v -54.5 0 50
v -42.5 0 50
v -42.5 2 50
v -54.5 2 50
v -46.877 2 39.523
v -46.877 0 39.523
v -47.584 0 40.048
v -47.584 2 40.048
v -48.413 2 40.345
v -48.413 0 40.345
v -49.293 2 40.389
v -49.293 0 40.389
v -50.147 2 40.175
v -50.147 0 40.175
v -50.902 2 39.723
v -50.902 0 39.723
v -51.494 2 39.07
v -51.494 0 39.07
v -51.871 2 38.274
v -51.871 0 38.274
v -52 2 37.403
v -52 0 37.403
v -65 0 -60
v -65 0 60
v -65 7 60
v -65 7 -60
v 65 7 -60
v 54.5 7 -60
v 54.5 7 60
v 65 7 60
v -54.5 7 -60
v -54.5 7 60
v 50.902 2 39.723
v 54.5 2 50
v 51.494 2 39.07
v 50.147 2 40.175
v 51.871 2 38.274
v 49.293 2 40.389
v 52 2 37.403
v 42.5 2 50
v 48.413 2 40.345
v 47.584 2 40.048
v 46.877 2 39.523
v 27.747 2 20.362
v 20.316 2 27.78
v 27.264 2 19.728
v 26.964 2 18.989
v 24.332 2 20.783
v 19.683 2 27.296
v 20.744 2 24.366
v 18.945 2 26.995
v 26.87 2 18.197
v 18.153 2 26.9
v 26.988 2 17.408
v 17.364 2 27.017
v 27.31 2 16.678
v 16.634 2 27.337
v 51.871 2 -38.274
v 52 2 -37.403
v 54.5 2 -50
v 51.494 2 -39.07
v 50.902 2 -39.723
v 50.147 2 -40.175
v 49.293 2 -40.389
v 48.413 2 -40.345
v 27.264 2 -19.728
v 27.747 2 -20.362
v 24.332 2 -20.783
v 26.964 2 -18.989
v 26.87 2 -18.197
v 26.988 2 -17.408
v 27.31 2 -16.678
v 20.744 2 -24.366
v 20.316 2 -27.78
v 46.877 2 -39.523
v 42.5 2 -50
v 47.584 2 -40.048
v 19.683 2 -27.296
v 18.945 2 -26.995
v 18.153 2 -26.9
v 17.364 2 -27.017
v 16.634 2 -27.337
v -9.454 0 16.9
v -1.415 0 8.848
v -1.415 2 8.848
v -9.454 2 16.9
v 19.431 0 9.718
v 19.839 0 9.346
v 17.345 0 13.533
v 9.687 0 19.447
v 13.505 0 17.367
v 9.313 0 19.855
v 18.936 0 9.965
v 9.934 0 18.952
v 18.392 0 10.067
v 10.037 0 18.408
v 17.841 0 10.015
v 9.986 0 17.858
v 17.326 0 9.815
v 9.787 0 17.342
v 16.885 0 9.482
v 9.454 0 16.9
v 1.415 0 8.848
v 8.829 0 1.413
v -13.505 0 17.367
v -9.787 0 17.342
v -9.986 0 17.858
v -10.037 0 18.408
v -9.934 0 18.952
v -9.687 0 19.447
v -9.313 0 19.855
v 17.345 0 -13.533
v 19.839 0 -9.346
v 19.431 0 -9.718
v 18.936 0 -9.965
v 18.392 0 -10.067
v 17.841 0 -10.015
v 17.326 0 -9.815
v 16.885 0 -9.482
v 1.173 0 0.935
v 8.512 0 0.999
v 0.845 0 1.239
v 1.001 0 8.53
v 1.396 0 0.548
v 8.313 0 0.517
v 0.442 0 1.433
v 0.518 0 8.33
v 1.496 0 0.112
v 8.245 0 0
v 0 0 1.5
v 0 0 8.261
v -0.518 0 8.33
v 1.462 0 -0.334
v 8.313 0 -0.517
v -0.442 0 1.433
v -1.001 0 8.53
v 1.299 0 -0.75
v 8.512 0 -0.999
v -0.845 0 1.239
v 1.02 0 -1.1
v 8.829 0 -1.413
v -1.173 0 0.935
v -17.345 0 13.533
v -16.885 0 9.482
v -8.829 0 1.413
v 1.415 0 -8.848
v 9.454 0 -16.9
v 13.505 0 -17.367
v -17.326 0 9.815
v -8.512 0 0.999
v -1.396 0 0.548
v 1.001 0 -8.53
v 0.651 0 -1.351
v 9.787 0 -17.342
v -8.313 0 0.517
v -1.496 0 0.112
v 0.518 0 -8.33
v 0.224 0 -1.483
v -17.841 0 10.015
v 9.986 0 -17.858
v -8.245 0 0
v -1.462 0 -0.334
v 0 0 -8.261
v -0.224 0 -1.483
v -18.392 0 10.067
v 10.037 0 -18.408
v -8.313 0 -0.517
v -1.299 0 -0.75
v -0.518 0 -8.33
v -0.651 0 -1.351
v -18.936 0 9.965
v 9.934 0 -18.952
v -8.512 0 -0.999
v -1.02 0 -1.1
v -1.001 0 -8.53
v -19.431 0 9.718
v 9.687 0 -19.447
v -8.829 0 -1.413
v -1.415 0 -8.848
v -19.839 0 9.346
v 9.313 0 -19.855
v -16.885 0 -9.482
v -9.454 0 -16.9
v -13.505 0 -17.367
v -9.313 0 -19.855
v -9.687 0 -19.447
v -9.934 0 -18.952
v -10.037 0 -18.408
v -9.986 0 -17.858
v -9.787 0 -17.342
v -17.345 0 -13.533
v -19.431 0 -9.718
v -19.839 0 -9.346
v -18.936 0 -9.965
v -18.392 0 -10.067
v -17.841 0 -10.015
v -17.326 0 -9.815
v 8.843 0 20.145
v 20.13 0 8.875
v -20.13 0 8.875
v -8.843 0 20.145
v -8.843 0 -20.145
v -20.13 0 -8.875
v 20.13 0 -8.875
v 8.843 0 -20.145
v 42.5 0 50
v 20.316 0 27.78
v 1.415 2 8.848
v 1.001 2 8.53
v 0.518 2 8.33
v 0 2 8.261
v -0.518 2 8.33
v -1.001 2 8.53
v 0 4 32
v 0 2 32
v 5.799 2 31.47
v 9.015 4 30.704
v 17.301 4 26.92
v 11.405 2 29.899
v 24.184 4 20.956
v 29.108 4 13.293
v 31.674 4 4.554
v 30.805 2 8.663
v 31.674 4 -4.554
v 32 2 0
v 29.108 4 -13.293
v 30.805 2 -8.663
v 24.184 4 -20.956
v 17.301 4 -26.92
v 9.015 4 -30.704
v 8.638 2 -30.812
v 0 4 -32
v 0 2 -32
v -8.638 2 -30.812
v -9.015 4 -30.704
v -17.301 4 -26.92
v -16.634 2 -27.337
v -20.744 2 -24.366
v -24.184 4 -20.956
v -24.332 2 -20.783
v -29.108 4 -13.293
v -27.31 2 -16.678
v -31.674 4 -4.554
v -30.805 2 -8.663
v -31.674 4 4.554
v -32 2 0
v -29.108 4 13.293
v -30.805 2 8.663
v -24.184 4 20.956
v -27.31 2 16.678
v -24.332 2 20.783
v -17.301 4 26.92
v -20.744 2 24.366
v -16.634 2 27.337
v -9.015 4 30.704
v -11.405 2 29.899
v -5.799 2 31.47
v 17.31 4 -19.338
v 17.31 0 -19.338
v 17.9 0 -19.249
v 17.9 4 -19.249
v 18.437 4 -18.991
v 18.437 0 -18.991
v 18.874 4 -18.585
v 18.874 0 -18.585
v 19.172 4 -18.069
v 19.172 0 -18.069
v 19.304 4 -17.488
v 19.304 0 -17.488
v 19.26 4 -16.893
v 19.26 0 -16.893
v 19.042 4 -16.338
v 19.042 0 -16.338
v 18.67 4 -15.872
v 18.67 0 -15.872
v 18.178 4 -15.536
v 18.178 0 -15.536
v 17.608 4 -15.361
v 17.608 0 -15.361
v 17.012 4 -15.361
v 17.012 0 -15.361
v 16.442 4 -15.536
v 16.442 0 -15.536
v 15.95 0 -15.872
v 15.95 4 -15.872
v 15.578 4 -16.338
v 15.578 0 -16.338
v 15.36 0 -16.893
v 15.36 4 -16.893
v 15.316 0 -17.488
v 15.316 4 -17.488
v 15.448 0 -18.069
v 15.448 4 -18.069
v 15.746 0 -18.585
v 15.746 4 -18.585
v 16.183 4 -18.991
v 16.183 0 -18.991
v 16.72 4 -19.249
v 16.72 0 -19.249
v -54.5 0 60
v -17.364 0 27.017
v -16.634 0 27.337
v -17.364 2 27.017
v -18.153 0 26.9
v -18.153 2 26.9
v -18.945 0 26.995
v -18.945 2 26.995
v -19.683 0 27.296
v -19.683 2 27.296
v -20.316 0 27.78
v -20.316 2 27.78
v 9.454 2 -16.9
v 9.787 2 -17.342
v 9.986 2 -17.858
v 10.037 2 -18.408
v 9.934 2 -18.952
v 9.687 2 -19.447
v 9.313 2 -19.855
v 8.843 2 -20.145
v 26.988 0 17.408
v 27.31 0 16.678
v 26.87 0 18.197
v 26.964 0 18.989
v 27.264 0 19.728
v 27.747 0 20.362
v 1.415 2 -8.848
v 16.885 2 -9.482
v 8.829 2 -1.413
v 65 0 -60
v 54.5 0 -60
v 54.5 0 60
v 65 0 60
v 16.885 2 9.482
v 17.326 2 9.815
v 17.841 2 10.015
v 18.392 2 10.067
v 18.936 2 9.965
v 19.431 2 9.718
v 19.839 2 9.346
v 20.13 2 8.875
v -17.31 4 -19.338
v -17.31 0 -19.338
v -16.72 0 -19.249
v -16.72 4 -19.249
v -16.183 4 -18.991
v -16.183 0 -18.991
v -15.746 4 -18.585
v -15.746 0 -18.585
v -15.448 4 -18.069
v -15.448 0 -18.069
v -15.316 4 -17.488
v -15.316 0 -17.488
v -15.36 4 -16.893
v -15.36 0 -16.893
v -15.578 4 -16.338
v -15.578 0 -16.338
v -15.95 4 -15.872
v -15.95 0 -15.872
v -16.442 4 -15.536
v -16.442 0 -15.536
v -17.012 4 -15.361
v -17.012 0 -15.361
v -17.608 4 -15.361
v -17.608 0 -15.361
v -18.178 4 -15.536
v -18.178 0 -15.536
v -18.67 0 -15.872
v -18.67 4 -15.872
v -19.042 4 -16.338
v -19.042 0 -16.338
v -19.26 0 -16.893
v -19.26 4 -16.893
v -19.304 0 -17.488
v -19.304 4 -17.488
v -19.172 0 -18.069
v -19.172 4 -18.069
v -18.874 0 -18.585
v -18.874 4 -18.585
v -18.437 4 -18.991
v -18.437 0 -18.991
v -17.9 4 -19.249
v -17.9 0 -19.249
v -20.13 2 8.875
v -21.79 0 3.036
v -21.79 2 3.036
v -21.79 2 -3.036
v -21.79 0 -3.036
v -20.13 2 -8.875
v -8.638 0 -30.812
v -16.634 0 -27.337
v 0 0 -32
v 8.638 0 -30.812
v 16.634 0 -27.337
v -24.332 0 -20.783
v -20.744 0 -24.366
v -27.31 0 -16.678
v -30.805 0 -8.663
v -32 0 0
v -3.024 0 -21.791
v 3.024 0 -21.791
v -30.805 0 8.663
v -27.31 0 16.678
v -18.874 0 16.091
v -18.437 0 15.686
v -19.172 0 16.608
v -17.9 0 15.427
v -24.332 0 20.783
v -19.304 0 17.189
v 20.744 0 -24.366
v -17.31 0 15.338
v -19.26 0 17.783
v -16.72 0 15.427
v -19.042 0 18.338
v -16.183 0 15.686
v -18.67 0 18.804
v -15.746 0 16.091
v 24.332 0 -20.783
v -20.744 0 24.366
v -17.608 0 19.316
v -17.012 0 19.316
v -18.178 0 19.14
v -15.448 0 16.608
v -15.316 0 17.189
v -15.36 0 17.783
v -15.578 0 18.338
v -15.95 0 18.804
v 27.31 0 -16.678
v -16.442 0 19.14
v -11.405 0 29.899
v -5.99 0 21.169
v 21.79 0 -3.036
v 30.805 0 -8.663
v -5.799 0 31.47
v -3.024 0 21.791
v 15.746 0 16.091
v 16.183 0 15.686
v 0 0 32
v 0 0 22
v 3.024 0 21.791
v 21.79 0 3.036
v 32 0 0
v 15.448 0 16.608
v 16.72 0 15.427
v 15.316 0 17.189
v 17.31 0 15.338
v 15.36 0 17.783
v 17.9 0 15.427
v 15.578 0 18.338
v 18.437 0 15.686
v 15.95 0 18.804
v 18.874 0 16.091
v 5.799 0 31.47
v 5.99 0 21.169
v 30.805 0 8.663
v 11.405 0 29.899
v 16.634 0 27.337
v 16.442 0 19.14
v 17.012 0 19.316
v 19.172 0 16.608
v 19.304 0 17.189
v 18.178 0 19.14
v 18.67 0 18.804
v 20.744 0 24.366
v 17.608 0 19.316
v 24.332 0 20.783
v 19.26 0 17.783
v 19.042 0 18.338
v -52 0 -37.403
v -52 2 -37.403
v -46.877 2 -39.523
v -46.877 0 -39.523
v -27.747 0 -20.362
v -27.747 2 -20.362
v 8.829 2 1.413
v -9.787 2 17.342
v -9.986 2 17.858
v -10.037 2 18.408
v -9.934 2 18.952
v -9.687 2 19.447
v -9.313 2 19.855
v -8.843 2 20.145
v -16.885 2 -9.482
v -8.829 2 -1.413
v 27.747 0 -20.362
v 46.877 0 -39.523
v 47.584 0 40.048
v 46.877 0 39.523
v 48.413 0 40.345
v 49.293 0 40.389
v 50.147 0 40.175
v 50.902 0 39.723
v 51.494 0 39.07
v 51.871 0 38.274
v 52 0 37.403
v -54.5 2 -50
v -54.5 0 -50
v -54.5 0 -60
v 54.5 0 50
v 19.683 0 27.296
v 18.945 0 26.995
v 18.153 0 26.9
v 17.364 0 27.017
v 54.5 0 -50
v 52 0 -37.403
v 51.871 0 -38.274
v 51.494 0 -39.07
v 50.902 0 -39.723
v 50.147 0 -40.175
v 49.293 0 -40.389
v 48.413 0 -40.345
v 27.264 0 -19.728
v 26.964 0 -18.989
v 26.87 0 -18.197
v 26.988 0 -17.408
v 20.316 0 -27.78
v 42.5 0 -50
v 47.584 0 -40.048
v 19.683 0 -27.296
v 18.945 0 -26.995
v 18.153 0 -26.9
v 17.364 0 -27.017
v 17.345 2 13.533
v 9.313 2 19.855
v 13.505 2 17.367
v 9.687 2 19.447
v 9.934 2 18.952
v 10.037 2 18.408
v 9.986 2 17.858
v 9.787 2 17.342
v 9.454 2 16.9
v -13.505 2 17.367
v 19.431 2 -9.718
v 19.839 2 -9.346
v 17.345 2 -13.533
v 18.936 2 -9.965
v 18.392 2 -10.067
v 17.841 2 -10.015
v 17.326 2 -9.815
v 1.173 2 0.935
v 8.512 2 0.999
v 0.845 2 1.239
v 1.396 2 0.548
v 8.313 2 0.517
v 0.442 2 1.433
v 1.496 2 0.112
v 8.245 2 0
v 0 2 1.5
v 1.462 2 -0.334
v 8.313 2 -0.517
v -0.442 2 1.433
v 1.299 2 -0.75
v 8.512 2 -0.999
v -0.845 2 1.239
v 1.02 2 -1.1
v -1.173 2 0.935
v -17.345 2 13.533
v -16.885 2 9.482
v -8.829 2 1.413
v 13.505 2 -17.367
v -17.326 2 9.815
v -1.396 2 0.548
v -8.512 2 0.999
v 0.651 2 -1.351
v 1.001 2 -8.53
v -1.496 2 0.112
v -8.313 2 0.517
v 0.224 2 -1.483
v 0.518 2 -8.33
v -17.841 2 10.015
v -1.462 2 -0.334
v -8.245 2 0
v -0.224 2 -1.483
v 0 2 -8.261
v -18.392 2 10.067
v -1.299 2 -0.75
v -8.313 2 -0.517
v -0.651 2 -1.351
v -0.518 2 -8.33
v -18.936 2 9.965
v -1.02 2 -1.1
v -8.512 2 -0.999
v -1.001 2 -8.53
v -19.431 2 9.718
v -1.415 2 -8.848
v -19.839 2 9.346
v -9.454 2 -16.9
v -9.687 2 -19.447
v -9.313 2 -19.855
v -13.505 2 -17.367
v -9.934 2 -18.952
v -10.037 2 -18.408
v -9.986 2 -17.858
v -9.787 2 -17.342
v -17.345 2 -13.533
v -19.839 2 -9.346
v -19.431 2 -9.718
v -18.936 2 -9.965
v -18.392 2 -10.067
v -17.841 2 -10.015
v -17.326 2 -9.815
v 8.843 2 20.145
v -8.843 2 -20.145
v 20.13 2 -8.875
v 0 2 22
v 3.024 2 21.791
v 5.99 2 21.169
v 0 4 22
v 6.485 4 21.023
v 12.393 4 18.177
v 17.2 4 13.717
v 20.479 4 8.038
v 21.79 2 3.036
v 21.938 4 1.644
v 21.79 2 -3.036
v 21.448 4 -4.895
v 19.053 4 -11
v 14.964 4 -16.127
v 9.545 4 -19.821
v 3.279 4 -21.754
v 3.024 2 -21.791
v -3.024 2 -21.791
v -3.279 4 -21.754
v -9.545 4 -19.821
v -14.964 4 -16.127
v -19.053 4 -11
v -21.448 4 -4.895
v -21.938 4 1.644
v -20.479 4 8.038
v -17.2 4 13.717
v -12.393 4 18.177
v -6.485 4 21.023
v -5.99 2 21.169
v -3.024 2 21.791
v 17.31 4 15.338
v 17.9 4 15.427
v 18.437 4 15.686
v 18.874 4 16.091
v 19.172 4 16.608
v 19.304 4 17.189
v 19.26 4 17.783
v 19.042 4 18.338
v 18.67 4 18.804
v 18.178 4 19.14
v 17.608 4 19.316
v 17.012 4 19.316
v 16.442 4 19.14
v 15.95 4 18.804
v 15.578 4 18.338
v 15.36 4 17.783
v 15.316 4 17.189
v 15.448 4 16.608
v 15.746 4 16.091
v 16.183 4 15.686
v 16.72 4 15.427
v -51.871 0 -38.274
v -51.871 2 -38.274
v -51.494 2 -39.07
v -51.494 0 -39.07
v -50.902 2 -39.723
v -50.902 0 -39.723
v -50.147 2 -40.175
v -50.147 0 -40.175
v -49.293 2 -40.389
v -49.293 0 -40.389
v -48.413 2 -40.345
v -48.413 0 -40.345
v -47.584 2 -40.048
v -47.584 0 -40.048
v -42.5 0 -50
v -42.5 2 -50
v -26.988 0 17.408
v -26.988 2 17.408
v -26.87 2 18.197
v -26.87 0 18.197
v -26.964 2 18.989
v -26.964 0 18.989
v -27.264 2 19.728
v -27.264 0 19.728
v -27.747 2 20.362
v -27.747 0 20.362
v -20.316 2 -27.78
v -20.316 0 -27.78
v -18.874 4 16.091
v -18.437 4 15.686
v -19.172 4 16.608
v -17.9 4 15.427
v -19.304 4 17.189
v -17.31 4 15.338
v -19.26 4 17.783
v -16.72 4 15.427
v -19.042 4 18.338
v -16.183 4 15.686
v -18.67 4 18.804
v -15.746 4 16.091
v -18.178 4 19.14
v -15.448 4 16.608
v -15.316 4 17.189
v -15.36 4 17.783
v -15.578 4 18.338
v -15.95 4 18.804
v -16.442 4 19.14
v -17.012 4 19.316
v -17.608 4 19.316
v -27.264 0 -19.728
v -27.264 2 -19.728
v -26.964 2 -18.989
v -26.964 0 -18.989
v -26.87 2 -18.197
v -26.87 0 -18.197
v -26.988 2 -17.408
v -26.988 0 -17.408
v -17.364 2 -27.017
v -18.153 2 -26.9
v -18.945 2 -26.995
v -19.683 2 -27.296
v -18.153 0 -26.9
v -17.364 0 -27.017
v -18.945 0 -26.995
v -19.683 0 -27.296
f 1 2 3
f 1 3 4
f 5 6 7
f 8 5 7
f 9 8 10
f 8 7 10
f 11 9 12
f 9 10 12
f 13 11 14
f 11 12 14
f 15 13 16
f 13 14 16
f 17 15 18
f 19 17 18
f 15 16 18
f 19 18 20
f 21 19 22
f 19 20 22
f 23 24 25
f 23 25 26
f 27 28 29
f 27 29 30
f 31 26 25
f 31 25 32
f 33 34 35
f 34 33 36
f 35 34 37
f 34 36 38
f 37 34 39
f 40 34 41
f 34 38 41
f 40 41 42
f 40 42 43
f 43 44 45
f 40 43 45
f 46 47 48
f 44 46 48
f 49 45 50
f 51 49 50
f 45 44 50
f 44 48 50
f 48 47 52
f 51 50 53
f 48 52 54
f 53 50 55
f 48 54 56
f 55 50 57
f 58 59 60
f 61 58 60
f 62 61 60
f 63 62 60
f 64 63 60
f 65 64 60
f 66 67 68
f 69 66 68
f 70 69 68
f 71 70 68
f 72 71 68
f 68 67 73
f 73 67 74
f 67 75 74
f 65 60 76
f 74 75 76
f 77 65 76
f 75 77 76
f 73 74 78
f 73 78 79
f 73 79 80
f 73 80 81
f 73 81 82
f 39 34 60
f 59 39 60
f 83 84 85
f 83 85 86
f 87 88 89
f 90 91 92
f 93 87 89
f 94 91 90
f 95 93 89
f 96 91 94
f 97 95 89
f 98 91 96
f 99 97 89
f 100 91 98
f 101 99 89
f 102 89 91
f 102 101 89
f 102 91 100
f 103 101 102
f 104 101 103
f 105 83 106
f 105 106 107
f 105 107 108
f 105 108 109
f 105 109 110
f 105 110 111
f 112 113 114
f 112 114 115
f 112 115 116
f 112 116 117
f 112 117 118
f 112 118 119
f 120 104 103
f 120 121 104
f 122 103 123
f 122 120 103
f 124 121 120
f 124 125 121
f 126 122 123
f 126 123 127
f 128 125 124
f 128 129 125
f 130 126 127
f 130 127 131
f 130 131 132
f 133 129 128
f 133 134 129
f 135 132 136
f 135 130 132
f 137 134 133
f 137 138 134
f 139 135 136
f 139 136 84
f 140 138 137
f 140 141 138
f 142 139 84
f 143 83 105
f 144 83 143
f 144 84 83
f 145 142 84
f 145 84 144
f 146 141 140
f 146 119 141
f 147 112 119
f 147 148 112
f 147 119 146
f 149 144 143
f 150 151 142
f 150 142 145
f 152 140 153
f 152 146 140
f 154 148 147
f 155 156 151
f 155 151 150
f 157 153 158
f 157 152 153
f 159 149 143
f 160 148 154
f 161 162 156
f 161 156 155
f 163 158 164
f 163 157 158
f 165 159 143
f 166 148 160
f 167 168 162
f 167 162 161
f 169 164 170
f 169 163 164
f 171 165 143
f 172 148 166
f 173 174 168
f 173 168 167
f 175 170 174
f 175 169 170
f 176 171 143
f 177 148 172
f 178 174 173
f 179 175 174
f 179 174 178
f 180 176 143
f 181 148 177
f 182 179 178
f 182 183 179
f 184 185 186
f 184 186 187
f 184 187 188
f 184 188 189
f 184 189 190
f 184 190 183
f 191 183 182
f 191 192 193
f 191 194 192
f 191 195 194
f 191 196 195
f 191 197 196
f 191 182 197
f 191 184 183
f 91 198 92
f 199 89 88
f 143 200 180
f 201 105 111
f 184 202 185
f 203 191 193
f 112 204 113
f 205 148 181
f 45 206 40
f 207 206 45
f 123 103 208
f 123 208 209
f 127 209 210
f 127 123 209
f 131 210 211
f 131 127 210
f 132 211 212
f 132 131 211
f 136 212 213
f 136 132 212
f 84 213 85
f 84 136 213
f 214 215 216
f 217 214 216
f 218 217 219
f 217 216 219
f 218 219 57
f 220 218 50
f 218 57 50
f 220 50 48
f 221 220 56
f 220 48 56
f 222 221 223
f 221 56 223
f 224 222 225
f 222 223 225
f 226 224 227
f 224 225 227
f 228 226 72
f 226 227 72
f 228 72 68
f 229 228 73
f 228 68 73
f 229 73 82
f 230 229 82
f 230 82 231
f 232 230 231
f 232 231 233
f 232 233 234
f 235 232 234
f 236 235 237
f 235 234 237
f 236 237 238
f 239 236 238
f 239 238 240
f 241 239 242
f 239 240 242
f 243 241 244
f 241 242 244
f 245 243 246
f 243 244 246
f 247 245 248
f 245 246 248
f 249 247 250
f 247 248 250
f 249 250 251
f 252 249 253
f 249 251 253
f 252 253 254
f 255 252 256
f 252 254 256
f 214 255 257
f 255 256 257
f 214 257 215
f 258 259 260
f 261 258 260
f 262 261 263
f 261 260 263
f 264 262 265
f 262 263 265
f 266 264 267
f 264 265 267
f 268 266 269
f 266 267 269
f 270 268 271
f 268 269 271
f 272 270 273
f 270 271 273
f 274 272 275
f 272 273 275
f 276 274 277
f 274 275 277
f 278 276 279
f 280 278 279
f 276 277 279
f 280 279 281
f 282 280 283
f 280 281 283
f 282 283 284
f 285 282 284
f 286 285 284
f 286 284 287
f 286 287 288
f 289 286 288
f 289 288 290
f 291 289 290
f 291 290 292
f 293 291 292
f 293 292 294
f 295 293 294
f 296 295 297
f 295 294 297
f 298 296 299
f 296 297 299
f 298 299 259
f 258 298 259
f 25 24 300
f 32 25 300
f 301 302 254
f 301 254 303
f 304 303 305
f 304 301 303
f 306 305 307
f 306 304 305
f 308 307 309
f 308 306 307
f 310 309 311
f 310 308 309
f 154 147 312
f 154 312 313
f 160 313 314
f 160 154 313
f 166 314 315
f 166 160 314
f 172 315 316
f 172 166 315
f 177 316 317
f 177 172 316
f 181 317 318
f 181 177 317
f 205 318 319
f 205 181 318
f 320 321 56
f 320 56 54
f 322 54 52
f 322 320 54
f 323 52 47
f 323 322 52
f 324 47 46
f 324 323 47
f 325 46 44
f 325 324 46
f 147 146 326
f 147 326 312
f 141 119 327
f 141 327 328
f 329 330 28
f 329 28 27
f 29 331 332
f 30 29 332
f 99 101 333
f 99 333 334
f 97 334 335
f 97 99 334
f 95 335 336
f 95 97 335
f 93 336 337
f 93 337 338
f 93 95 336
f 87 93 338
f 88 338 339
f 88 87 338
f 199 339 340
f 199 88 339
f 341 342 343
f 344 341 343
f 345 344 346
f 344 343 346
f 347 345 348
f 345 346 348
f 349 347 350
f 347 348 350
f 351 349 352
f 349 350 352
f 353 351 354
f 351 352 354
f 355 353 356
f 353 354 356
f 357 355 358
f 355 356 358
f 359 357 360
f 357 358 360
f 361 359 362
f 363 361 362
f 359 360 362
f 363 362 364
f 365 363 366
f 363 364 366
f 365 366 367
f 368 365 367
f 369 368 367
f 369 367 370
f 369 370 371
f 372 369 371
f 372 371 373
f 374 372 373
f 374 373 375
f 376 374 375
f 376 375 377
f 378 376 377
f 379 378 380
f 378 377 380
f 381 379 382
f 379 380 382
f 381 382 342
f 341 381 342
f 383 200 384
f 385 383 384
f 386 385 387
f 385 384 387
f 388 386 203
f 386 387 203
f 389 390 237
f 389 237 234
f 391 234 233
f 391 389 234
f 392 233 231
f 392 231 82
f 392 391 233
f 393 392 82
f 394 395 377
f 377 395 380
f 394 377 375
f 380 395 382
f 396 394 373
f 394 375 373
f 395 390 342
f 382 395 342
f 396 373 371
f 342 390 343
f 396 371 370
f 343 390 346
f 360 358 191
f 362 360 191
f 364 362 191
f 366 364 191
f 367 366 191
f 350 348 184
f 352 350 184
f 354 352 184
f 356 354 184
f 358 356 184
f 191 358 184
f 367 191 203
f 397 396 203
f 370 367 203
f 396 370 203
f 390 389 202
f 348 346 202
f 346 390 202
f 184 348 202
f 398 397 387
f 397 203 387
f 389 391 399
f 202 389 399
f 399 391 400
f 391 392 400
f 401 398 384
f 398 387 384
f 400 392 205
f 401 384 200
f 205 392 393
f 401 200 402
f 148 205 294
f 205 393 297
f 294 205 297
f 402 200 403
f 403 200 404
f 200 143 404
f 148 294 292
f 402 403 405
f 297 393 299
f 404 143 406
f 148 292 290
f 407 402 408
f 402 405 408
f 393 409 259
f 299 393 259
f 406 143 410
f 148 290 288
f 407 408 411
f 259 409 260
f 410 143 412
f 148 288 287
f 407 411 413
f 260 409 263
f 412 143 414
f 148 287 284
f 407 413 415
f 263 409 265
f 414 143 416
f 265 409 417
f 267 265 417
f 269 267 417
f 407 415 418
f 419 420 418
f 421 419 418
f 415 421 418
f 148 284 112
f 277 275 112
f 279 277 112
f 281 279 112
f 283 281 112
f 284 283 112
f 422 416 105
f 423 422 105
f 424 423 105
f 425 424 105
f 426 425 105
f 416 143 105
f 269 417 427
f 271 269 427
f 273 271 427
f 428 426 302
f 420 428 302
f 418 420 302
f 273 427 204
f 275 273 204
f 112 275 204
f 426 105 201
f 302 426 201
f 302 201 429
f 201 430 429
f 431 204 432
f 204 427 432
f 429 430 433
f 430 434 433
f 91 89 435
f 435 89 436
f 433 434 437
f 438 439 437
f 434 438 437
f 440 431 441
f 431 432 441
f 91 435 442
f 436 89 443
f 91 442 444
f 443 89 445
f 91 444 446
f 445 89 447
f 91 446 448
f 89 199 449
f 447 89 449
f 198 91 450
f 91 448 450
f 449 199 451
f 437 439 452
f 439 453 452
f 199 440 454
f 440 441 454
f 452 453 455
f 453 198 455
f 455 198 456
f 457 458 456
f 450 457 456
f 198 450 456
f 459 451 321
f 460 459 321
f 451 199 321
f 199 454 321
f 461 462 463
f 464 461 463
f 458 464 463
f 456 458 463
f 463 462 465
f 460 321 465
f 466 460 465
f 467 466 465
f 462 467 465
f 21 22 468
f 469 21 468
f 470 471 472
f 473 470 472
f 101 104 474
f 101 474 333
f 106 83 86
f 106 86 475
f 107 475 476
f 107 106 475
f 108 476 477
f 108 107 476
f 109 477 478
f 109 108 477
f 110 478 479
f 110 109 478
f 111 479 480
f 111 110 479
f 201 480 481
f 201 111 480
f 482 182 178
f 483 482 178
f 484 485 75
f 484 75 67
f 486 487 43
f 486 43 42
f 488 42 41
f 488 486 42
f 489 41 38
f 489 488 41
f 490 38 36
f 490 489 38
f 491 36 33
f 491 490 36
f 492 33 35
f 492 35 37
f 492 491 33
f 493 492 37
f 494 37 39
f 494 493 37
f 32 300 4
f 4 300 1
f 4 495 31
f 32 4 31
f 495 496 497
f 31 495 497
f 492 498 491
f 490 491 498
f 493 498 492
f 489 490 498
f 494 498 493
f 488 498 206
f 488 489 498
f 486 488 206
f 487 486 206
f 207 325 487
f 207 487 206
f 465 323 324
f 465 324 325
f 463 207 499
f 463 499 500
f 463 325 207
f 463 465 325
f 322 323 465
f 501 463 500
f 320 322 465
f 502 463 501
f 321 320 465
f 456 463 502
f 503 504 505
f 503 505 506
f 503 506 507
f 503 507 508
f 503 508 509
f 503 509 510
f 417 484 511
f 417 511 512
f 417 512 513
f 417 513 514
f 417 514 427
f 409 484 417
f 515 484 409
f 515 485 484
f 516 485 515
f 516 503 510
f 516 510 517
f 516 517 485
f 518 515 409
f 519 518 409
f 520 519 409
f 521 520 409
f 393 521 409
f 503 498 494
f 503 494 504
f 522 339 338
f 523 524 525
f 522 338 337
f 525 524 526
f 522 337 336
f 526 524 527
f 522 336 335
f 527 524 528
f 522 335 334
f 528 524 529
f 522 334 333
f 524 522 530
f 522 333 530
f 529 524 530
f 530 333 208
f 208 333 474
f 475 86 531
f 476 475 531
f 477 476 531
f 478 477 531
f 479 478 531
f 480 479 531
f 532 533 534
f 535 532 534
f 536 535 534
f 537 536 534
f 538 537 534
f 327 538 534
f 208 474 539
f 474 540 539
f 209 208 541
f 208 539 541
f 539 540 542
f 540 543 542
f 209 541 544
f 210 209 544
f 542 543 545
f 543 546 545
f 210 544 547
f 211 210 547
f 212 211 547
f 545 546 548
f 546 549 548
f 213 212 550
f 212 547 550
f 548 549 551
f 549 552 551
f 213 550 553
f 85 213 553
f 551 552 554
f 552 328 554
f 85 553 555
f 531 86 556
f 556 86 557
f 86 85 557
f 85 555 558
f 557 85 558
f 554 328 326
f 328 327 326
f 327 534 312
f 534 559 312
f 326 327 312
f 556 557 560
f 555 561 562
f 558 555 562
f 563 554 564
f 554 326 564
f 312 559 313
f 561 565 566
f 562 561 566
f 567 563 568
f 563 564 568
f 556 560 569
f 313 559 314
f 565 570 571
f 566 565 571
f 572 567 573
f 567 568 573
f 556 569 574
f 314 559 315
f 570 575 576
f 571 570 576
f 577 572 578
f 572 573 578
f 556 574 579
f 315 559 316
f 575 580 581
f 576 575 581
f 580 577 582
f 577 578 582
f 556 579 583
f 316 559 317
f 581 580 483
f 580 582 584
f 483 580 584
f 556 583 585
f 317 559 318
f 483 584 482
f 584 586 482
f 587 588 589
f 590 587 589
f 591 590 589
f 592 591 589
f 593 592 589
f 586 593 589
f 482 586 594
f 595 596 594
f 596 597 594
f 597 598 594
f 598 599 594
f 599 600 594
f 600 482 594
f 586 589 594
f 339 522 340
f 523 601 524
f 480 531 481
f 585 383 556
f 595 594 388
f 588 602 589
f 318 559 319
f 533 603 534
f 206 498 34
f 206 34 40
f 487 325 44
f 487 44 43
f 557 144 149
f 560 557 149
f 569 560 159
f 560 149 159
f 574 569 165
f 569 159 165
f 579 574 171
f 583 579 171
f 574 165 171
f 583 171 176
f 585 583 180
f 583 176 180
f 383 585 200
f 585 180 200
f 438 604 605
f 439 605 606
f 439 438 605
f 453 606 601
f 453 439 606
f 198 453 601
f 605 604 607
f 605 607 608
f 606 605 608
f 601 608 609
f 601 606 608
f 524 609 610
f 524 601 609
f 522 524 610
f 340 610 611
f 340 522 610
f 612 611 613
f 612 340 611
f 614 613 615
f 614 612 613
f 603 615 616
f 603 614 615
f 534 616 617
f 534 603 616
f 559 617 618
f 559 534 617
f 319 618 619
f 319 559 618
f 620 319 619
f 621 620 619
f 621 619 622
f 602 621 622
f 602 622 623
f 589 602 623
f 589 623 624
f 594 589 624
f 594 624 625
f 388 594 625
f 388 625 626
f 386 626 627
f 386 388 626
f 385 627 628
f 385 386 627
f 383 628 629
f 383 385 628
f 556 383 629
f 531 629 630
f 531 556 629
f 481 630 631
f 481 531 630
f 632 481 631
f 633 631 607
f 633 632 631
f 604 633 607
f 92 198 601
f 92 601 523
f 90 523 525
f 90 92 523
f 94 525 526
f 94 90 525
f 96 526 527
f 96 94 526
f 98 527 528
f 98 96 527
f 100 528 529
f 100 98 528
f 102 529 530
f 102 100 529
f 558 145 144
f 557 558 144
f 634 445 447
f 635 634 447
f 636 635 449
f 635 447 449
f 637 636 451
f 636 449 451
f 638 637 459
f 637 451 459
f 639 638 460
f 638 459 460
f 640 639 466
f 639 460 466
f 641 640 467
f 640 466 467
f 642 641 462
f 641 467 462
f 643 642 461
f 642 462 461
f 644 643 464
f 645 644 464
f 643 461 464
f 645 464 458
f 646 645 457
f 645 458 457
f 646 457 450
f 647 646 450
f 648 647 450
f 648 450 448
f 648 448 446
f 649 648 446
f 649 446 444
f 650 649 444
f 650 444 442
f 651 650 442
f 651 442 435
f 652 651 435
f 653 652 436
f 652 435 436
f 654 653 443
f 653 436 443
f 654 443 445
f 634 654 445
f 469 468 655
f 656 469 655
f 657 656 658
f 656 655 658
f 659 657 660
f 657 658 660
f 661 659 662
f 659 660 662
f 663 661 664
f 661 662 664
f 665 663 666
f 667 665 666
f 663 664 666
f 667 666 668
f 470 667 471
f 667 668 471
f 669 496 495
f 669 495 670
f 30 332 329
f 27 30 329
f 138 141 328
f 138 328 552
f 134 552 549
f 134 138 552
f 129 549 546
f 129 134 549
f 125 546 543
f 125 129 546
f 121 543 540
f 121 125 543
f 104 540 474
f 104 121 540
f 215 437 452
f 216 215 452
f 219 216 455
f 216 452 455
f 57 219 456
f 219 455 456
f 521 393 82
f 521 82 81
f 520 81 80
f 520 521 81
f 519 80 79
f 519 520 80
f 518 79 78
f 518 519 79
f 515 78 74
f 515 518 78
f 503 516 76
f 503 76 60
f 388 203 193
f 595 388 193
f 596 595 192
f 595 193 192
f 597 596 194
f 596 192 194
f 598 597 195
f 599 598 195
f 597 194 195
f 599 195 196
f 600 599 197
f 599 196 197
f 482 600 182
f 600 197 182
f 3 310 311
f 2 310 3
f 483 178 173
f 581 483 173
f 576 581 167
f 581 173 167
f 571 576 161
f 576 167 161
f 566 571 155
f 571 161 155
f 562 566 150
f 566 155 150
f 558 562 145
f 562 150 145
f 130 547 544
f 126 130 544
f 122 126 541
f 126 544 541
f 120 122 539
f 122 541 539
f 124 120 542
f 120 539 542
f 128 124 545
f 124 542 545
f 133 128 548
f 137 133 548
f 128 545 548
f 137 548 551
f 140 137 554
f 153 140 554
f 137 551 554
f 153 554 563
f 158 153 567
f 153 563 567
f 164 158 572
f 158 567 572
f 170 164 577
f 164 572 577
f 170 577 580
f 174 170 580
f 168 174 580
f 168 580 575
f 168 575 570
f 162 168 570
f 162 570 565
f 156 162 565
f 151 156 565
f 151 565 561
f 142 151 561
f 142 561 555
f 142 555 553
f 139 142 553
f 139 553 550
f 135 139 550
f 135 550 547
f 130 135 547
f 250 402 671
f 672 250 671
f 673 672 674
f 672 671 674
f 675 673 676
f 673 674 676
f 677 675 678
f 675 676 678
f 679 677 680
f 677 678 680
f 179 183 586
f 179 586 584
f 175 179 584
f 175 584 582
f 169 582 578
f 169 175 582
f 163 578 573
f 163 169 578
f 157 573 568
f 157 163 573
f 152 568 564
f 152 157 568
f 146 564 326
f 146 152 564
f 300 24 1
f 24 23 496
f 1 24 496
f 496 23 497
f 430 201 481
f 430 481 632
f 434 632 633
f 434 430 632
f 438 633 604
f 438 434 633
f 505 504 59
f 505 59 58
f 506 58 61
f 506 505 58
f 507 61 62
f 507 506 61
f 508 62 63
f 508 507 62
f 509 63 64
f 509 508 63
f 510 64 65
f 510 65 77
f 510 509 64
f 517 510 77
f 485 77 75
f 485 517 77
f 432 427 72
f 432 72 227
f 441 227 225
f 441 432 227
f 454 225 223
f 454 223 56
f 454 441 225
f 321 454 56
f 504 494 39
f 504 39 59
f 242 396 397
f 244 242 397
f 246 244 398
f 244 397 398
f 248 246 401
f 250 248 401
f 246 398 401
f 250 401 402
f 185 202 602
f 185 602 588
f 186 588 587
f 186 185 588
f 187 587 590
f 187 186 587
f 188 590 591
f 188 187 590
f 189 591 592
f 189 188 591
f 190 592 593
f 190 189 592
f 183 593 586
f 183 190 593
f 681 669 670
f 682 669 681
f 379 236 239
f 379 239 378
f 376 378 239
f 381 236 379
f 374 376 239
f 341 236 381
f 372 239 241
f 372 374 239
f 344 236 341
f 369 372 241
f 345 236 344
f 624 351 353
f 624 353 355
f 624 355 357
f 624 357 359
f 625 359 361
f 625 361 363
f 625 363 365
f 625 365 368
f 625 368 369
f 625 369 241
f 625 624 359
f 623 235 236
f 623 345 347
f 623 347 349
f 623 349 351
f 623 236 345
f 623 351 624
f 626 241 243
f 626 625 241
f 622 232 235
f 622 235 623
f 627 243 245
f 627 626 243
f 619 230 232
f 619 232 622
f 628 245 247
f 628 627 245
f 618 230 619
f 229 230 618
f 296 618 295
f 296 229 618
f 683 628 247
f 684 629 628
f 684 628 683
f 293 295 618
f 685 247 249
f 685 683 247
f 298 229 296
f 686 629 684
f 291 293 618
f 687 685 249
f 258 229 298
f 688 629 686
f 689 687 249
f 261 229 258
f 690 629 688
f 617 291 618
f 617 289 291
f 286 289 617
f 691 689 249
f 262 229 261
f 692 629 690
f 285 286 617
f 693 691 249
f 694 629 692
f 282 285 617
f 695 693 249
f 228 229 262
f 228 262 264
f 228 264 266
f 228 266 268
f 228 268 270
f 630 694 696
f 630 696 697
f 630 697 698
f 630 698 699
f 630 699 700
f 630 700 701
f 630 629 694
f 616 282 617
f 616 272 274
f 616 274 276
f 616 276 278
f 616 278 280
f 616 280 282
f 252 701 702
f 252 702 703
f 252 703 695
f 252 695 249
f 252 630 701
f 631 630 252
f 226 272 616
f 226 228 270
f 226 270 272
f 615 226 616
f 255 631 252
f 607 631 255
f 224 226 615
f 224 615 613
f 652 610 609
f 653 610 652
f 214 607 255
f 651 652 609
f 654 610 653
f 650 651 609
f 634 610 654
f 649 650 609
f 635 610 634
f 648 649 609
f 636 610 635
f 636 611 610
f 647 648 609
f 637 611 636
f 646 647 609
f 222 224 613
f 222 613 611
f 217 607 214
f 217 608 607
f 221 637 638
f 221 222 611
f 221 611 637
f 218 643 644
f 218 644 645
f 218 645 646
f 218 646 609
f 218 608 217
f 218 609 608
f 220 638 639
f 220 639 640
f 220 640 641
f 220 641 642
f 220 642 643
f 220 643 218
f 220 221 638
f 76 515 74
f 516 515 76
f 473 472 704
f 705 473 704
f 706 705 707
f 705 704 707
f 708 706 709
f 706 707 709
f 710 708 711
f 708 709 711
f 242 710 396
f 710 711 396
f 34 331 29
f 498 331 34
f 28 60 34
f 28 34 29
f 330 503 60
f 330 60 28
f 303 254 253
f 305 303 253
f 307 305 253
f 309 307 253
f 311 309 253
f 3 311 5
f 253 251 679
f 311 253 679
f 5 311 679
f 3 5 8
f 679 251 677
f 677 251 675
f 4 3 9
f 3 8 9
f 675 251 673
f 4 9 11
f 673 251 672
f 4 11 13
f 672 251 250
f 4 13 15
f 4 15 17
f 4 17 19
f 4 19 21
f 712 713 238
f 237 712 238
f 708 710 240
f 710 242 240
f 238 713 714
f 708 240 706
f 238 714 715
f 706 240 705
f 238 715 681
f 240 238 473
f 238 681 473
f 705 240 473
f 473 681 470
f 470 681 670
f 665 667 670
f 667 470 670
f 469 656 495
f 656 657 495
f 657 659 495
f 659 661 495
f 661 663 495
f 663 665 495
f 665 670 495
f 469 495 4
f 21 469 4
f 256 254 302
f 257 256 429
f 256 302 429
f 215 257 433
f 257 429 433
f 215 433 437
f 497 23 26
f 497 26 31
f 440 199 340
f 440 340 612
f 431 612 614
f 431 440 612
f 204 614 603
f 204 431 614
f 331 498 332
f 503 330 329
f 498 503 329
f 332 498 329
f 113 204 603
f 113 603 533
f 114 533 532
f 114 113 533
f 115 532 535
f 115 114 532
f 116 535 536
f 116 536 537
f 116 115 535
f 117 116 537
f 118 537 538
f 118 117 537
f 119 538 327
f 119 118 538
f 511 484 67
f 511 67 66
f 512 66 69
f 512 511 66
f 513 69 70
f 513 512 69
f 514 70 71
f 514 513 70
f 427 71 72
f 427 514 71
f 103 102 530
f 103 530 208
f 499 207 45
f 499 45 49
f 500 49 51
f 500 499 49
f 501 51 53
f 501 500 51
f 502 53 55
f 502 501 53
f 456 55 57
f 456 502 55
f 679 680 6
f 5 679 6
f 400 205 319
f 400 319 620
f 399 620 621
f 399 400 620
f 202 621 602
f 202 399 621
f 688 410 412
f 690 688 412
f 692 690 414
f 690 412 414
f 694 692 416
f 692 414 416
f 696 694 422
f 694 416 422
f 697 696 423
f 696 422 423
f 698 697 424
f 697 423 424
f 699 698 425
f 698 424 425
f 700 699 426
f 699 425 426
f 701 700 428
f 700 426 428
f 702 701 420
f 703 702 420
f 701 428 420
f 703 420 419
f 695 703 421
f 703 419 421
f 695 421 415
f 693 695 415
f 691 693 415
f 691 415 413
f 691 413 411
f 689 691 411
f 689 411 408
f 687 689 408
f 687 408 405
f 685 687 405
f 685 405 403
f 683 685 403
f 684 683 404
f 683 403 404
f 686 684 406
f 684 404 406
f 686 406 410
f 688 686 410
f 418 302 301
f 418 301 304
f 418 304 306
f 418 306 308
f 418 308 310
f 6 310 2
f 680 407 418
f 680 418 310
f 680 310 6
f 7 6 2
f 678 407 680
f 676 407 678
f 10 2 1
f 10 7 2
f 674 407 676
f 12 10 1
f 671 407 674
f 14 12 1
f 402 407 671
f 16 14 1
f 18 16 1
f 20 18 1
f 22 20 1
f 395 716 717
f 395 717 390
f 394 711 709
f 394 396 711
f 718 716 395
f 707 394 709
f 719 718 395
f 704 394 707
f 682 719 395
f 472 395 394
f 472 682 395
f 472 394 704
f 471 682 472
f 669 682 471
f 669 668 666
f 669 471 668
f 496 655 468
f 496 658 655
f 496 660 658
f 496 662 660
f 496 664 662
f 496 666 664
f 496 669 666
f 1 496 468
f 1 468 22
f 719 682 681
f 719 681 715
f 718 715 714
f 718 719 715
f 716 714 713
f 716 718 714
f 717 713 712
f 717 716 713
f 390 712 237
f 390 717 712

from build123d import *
from build123d.topology import SkipClean

# Parameters (mm, degrees)
SKETCH1_R             = 32
SKETCH1_R_2           = 22
BOSS_EXTRUDE2_DEPTH   = 4
SKETCH3_W             = 10.5
SKETCH3_H             = 120
BOSS_EXTRUDE4_DEPTH   = 7
BOSS_EXTRUDE4_2_DEPTH = 7
BOSS_EXTRUDE5_DEPTH   = 2
SKETCH5_R             = 1.5
CUT_EXTRUDE1_DEPTH    = 4
SKETCH6_R             = 2
CUT_EXTRUDE2_DEPTH    = 4


with BuildPart() as part:
    # Sketch1 → Boss-Extrude2 (new body)
    with BuildSketch(Plane(origin=(0, 0, 0), x_dir=(1, 0, 0), z_dir=(0, 1, 0))):
        with Locations(Location((0, 0, 0), (0, 0, 270))):
            Circle(SKETCH1_R)
        with Locations(Location((0, 0, 0), (0, 0, 270))):
            Circle(SKETCH1_R_2, mode=Mode.SUBTRACT)
    extrude(amount=BOSS_EXTRUDE2_DEPTH)



with BuildPart() as body_2:
    # Sketch3 → Boss-Extrude4 (new body)
    with BuildSketch(Plane(origin=(0, 0, 0), x_dir=(1, 0, 0), z_dir=(0, 1, 0))):
        with Locations((-59.75, 0)):
            Rectangle(SKETCH3_W, SKETCH3_H)
    extrude(amount=BOSS_EXTRUDE4_DEPTH)


with BuildPart() as body_3:
    # Sketch3 → Boss-Extrude4 2 (new body)
    with BuildSketch(Plane(origin=(0, 0, 0), x_dir=(1, 0, 0), z_dir=(0, 1, 0))):
        with Locations((59.75, 0)):
            Rectangle(SKETCH3_W, SKETCH3_H)
    extrude(amount=BOSS_EXTRUDE4_2_DEPTH)


with BuildPart() as part_1:
    with SkipClean():  # the faces are left unmerged after this step: merging them gives an invalid solid
        add(part.part)

        add(body_2.part)  # Boss-Extrude5 merges body 2

        add(body_3.part)  # Boss-Extrude5 merges body 3
        # Sketch4 → Boss-Extrude5 (add)
        with BuildSketch(Plane(origin=(0, 0, 0), x_dir=(1, 0, 0), z_dir=(0, 1, 0))):
            with BuildLine():
                Line((-54.5, 50), (-42.5, 50))
                Line((-42.5, 50), (-20.316435899, 27.780252561))
                ThreePointArc((-20.316435899, 27.780252561), (-18.551903635, 26.921342904), (-16.633954414, 27.336999845))
                ThreePointArc((-16.633954414, 27.336999845), (0, 32), (16.633954414, 27.336999845))
                ThreePointArc((16.633954414, 27.336999845), (18.551903635, 26.921342904), (20.316435899, 27.780252561))
                Line((20.316435899, 27.780252561), (42.5, 50))
                Line((42.5, 50), (54.5, 50))
                Line((54.5, 50), (54.5, -50))
                Line((54.5, -50), (42.5, -50))
                Line((42.5, -50), (20.316435899, -27.780252561))
                ThreePointArc((20.316435899, -27.780252561), (18.551903635, -26.921342904), (16.633954414, -27.336999845))
                ThreePointArc((16.633954414, -27.336999845), (0, -32), (-16.633954414, -27.336999845))
                ThreePointArc((-16.633954414, -27.336999845), (-18.551903635, -26.921342904), (-20.316435899, -27.780252561))
                Line((-20.316435899, -27.780252561), (-42.5, -50))
                Line((-42.5, -50), (-54.5, -50))
                Line((-54.5, -50), (-54.5, 50))
            make_face()
            with BuildLine():
                Line((-52, -37.403142366), (-52, 37.403142366))
                ThreePointArc((-52, 37.403142366), (-50.146920927, 40.175248495), (-46.876951741, 39.522733386))
                Line((-46.876951741, 39.522733386), (-27.747104804, 20.361683992))
                ThreePointArc((-27.747104804, 20.361683992), (-26.891072048, 18.595754257), (-27.309854229, 16.678485003))
                ThreePointArc((-27.309854229, 16.678485003), (-32, 0), (-27.309854229, -16.678485003))
                ThreePointArc((-27.309854229, -16.678485003), (-26.891072048, -18.595754257), (-27.747104804, -20.361683992))
                Line((-27.747104804, -20.361683992), (-46.876951741, -39.522733386))
                ThreePointArc((-46.876951741, -39.522733386), (-50.146920927, -40.175248495), (-52, -37.403142366))
            make_face(mode=Mode.SUBTRACT)
            with BuildLine():
                Line((52, -37.403142366), (52, 37.403142366))
                ThreePointArc((52, 37.403142366), (50.146920927, 40.175248495), (46.876951741, 39.522733386))
                Line((46.876951741, 39.522733386), (27.747104804, 20.361683992))
                ThreePointArc((27.747104804, 20.361683992), (26.891072048, 18.595754257), (27.309854229, 16.678485003))
                ThreePointArc((27.309854229, 16.678485003), (32, 0), (27.309854229, -16.678485003))
                ThreePointArc((27.309854229, -16.678485003), (26.891072048, -18.595754257), (27.747104804, -20.361683992))
                Line((27.747104804, -20.361683992), (46.876951741, -39.522733386))
                ThreePointArc((46.876951741, -39.522733386), (50.146920927, -40.175248495), (52, -37.403142366))
            make_face(mode=Mode.SUBTRACT)
            with BuildLine():
                Line((-8.829338029, -1.41306068), (-16.884830668, -9.481692534))
                ThreePointArc((-16.884830668, -9.481692534), (-18.667420028, -10.034629474), (-20.130215791, -8.875495039))
                ThreePointArc((-20.130215791, -8.875495039), (-22, 0), (-20.130215791, 8.875495039))
                ThreePointArc((-20.130215791, 8.875495039), (-18.667420028, 10.034629474), (-16.884830668, 9.481692534))
                Line((-16.884830668, 9.481692534), (-8.829338029, 1.41306068))
                ThreePointArc((-8.829338029, 1.41306068), (-8.244703535, 0), (-8.829338029, -1.41306068))
            make_face(mode=Mode.SUBTRACT)
            with BuildLine():
                Line((8.829338029, -1.41306068), (16.884830668, -9.481692534))
                ThreePointArc((16.884830668, -9.481692534), (18.667420028, -10.034629474), (20.130215791, -8.875495039))
                ThreePointArc((20.130215791, -8.875495039), (22, 0), (20.130215791, 8.875495039))
                ThreePointArc((20.130215791, 8.875495039), (18.667420028, 10.034629474), (16.884830668, 9.481692534))
                Line((16.884830668, 9.481692534), (8.829338029, 1.41306068))
                ThreePointArc((8.829338029, 1.41306068), (8.244703535, 0), (8.829338029, -1.41306068))
            make_face(mode=Mode.SUBTRACT)
            with BuildLine():
                Line((-9.454161763, 16.900261103), (-1.415365506, 8.848352865))
                ThreePointArc((-1.415365506, 8.848352865), (0, 8.261413545), (1.415365506, 8.848352865))
                Line((1.415365506, 8.848352865), (9.454161763, 16.900261103))
                ThreePointArc((9.454161763, 16.900261103), (10.00419278, 18.683749248), (8.842675883, 20.144653962))
                ThreePointArc((8.842675883, 20.144653962), (0, 22), (-8.842675883, 20.144653962))
                ThreePointArc((-8.842675883, 20.144653962), (-10.00419278, 18.683749248), (-9.454161763, 16.900261103))
            make_face(mode=Mode.SUBTRACT)
            with BuildLine():
                Line((9.454161763, -16.900261103), (1.415365506, -8.848352865))
                ThreePointArc((1.415365506, -8.848352865), (0, -8.261413545), (-1.415365506, -8.848352865))
                Line((-1.415365506, -8.848352865), (-9.454161763, -16.900261103))
                ThreePointArc((-9.454161763, -16.900261103), (-10.00419278, -18.683749248), (-8.842675883, -20.144653962))
                ThreePointArc((-8.842675883, -20.144653962), (0, -22), (8.842675883, -20.144653962))
                ThreePointArc((8.842675883, -20.144653962), (10.00419278, -18.683749248), (9.454161763, -16.900261103))
            make_face(mode=Mode.SUBTRACT)
        extrude(amount=BOSS_EXTRUDE5_DEPTH)

    # Sketch5 → Cut-Extrude1 (cut)
    with SkipClean():  # the faces are left unmerged after this step: merging them gives an invalid solid
        with BuildSketch(Plane(origin=(0, 2, 0), x_dir=(1, 0, 0), z_dir=(0, 1, 0))):
            with Locations(Location((0, 0, 0), (0, 0, 270))):
                Circle(SKETCH5_R)
        extrude(amount=-CUT_EXTRUDE1_DEPTH, mode=Mode.SUBTRACT)

    # Sketch6 → Cut-Extrude2 (cut)
    with SkipClean():  # the faces are left unmerged after this step: merging them gives an invalid solid
        with BuildSketch(Plane.XZ):
            with Locations(Location((-17.309993329, -17.338227446, 0), (0, 0, 270))):
                Circle(SKETCH6_R)
            with Locations(Location((17.309993329, -17.338227446, 0), (0, 0, 270))):
                Circle(SKETCH6_R)
            with Locations(Location((17.309993329, 17.338227446, 0), (0, 0, 270))):
                Circle(SKETCH6_R)
            with Locations(Location((-17.309993329, 17.338227446, 0), (0, 0, 270))):
                Circle(SKETCH6_R)
        extrude(amount=-CUT_EXTRUDE2_DEPTH, mode=Mode.SUBTRACT)


solid = part_1.part
